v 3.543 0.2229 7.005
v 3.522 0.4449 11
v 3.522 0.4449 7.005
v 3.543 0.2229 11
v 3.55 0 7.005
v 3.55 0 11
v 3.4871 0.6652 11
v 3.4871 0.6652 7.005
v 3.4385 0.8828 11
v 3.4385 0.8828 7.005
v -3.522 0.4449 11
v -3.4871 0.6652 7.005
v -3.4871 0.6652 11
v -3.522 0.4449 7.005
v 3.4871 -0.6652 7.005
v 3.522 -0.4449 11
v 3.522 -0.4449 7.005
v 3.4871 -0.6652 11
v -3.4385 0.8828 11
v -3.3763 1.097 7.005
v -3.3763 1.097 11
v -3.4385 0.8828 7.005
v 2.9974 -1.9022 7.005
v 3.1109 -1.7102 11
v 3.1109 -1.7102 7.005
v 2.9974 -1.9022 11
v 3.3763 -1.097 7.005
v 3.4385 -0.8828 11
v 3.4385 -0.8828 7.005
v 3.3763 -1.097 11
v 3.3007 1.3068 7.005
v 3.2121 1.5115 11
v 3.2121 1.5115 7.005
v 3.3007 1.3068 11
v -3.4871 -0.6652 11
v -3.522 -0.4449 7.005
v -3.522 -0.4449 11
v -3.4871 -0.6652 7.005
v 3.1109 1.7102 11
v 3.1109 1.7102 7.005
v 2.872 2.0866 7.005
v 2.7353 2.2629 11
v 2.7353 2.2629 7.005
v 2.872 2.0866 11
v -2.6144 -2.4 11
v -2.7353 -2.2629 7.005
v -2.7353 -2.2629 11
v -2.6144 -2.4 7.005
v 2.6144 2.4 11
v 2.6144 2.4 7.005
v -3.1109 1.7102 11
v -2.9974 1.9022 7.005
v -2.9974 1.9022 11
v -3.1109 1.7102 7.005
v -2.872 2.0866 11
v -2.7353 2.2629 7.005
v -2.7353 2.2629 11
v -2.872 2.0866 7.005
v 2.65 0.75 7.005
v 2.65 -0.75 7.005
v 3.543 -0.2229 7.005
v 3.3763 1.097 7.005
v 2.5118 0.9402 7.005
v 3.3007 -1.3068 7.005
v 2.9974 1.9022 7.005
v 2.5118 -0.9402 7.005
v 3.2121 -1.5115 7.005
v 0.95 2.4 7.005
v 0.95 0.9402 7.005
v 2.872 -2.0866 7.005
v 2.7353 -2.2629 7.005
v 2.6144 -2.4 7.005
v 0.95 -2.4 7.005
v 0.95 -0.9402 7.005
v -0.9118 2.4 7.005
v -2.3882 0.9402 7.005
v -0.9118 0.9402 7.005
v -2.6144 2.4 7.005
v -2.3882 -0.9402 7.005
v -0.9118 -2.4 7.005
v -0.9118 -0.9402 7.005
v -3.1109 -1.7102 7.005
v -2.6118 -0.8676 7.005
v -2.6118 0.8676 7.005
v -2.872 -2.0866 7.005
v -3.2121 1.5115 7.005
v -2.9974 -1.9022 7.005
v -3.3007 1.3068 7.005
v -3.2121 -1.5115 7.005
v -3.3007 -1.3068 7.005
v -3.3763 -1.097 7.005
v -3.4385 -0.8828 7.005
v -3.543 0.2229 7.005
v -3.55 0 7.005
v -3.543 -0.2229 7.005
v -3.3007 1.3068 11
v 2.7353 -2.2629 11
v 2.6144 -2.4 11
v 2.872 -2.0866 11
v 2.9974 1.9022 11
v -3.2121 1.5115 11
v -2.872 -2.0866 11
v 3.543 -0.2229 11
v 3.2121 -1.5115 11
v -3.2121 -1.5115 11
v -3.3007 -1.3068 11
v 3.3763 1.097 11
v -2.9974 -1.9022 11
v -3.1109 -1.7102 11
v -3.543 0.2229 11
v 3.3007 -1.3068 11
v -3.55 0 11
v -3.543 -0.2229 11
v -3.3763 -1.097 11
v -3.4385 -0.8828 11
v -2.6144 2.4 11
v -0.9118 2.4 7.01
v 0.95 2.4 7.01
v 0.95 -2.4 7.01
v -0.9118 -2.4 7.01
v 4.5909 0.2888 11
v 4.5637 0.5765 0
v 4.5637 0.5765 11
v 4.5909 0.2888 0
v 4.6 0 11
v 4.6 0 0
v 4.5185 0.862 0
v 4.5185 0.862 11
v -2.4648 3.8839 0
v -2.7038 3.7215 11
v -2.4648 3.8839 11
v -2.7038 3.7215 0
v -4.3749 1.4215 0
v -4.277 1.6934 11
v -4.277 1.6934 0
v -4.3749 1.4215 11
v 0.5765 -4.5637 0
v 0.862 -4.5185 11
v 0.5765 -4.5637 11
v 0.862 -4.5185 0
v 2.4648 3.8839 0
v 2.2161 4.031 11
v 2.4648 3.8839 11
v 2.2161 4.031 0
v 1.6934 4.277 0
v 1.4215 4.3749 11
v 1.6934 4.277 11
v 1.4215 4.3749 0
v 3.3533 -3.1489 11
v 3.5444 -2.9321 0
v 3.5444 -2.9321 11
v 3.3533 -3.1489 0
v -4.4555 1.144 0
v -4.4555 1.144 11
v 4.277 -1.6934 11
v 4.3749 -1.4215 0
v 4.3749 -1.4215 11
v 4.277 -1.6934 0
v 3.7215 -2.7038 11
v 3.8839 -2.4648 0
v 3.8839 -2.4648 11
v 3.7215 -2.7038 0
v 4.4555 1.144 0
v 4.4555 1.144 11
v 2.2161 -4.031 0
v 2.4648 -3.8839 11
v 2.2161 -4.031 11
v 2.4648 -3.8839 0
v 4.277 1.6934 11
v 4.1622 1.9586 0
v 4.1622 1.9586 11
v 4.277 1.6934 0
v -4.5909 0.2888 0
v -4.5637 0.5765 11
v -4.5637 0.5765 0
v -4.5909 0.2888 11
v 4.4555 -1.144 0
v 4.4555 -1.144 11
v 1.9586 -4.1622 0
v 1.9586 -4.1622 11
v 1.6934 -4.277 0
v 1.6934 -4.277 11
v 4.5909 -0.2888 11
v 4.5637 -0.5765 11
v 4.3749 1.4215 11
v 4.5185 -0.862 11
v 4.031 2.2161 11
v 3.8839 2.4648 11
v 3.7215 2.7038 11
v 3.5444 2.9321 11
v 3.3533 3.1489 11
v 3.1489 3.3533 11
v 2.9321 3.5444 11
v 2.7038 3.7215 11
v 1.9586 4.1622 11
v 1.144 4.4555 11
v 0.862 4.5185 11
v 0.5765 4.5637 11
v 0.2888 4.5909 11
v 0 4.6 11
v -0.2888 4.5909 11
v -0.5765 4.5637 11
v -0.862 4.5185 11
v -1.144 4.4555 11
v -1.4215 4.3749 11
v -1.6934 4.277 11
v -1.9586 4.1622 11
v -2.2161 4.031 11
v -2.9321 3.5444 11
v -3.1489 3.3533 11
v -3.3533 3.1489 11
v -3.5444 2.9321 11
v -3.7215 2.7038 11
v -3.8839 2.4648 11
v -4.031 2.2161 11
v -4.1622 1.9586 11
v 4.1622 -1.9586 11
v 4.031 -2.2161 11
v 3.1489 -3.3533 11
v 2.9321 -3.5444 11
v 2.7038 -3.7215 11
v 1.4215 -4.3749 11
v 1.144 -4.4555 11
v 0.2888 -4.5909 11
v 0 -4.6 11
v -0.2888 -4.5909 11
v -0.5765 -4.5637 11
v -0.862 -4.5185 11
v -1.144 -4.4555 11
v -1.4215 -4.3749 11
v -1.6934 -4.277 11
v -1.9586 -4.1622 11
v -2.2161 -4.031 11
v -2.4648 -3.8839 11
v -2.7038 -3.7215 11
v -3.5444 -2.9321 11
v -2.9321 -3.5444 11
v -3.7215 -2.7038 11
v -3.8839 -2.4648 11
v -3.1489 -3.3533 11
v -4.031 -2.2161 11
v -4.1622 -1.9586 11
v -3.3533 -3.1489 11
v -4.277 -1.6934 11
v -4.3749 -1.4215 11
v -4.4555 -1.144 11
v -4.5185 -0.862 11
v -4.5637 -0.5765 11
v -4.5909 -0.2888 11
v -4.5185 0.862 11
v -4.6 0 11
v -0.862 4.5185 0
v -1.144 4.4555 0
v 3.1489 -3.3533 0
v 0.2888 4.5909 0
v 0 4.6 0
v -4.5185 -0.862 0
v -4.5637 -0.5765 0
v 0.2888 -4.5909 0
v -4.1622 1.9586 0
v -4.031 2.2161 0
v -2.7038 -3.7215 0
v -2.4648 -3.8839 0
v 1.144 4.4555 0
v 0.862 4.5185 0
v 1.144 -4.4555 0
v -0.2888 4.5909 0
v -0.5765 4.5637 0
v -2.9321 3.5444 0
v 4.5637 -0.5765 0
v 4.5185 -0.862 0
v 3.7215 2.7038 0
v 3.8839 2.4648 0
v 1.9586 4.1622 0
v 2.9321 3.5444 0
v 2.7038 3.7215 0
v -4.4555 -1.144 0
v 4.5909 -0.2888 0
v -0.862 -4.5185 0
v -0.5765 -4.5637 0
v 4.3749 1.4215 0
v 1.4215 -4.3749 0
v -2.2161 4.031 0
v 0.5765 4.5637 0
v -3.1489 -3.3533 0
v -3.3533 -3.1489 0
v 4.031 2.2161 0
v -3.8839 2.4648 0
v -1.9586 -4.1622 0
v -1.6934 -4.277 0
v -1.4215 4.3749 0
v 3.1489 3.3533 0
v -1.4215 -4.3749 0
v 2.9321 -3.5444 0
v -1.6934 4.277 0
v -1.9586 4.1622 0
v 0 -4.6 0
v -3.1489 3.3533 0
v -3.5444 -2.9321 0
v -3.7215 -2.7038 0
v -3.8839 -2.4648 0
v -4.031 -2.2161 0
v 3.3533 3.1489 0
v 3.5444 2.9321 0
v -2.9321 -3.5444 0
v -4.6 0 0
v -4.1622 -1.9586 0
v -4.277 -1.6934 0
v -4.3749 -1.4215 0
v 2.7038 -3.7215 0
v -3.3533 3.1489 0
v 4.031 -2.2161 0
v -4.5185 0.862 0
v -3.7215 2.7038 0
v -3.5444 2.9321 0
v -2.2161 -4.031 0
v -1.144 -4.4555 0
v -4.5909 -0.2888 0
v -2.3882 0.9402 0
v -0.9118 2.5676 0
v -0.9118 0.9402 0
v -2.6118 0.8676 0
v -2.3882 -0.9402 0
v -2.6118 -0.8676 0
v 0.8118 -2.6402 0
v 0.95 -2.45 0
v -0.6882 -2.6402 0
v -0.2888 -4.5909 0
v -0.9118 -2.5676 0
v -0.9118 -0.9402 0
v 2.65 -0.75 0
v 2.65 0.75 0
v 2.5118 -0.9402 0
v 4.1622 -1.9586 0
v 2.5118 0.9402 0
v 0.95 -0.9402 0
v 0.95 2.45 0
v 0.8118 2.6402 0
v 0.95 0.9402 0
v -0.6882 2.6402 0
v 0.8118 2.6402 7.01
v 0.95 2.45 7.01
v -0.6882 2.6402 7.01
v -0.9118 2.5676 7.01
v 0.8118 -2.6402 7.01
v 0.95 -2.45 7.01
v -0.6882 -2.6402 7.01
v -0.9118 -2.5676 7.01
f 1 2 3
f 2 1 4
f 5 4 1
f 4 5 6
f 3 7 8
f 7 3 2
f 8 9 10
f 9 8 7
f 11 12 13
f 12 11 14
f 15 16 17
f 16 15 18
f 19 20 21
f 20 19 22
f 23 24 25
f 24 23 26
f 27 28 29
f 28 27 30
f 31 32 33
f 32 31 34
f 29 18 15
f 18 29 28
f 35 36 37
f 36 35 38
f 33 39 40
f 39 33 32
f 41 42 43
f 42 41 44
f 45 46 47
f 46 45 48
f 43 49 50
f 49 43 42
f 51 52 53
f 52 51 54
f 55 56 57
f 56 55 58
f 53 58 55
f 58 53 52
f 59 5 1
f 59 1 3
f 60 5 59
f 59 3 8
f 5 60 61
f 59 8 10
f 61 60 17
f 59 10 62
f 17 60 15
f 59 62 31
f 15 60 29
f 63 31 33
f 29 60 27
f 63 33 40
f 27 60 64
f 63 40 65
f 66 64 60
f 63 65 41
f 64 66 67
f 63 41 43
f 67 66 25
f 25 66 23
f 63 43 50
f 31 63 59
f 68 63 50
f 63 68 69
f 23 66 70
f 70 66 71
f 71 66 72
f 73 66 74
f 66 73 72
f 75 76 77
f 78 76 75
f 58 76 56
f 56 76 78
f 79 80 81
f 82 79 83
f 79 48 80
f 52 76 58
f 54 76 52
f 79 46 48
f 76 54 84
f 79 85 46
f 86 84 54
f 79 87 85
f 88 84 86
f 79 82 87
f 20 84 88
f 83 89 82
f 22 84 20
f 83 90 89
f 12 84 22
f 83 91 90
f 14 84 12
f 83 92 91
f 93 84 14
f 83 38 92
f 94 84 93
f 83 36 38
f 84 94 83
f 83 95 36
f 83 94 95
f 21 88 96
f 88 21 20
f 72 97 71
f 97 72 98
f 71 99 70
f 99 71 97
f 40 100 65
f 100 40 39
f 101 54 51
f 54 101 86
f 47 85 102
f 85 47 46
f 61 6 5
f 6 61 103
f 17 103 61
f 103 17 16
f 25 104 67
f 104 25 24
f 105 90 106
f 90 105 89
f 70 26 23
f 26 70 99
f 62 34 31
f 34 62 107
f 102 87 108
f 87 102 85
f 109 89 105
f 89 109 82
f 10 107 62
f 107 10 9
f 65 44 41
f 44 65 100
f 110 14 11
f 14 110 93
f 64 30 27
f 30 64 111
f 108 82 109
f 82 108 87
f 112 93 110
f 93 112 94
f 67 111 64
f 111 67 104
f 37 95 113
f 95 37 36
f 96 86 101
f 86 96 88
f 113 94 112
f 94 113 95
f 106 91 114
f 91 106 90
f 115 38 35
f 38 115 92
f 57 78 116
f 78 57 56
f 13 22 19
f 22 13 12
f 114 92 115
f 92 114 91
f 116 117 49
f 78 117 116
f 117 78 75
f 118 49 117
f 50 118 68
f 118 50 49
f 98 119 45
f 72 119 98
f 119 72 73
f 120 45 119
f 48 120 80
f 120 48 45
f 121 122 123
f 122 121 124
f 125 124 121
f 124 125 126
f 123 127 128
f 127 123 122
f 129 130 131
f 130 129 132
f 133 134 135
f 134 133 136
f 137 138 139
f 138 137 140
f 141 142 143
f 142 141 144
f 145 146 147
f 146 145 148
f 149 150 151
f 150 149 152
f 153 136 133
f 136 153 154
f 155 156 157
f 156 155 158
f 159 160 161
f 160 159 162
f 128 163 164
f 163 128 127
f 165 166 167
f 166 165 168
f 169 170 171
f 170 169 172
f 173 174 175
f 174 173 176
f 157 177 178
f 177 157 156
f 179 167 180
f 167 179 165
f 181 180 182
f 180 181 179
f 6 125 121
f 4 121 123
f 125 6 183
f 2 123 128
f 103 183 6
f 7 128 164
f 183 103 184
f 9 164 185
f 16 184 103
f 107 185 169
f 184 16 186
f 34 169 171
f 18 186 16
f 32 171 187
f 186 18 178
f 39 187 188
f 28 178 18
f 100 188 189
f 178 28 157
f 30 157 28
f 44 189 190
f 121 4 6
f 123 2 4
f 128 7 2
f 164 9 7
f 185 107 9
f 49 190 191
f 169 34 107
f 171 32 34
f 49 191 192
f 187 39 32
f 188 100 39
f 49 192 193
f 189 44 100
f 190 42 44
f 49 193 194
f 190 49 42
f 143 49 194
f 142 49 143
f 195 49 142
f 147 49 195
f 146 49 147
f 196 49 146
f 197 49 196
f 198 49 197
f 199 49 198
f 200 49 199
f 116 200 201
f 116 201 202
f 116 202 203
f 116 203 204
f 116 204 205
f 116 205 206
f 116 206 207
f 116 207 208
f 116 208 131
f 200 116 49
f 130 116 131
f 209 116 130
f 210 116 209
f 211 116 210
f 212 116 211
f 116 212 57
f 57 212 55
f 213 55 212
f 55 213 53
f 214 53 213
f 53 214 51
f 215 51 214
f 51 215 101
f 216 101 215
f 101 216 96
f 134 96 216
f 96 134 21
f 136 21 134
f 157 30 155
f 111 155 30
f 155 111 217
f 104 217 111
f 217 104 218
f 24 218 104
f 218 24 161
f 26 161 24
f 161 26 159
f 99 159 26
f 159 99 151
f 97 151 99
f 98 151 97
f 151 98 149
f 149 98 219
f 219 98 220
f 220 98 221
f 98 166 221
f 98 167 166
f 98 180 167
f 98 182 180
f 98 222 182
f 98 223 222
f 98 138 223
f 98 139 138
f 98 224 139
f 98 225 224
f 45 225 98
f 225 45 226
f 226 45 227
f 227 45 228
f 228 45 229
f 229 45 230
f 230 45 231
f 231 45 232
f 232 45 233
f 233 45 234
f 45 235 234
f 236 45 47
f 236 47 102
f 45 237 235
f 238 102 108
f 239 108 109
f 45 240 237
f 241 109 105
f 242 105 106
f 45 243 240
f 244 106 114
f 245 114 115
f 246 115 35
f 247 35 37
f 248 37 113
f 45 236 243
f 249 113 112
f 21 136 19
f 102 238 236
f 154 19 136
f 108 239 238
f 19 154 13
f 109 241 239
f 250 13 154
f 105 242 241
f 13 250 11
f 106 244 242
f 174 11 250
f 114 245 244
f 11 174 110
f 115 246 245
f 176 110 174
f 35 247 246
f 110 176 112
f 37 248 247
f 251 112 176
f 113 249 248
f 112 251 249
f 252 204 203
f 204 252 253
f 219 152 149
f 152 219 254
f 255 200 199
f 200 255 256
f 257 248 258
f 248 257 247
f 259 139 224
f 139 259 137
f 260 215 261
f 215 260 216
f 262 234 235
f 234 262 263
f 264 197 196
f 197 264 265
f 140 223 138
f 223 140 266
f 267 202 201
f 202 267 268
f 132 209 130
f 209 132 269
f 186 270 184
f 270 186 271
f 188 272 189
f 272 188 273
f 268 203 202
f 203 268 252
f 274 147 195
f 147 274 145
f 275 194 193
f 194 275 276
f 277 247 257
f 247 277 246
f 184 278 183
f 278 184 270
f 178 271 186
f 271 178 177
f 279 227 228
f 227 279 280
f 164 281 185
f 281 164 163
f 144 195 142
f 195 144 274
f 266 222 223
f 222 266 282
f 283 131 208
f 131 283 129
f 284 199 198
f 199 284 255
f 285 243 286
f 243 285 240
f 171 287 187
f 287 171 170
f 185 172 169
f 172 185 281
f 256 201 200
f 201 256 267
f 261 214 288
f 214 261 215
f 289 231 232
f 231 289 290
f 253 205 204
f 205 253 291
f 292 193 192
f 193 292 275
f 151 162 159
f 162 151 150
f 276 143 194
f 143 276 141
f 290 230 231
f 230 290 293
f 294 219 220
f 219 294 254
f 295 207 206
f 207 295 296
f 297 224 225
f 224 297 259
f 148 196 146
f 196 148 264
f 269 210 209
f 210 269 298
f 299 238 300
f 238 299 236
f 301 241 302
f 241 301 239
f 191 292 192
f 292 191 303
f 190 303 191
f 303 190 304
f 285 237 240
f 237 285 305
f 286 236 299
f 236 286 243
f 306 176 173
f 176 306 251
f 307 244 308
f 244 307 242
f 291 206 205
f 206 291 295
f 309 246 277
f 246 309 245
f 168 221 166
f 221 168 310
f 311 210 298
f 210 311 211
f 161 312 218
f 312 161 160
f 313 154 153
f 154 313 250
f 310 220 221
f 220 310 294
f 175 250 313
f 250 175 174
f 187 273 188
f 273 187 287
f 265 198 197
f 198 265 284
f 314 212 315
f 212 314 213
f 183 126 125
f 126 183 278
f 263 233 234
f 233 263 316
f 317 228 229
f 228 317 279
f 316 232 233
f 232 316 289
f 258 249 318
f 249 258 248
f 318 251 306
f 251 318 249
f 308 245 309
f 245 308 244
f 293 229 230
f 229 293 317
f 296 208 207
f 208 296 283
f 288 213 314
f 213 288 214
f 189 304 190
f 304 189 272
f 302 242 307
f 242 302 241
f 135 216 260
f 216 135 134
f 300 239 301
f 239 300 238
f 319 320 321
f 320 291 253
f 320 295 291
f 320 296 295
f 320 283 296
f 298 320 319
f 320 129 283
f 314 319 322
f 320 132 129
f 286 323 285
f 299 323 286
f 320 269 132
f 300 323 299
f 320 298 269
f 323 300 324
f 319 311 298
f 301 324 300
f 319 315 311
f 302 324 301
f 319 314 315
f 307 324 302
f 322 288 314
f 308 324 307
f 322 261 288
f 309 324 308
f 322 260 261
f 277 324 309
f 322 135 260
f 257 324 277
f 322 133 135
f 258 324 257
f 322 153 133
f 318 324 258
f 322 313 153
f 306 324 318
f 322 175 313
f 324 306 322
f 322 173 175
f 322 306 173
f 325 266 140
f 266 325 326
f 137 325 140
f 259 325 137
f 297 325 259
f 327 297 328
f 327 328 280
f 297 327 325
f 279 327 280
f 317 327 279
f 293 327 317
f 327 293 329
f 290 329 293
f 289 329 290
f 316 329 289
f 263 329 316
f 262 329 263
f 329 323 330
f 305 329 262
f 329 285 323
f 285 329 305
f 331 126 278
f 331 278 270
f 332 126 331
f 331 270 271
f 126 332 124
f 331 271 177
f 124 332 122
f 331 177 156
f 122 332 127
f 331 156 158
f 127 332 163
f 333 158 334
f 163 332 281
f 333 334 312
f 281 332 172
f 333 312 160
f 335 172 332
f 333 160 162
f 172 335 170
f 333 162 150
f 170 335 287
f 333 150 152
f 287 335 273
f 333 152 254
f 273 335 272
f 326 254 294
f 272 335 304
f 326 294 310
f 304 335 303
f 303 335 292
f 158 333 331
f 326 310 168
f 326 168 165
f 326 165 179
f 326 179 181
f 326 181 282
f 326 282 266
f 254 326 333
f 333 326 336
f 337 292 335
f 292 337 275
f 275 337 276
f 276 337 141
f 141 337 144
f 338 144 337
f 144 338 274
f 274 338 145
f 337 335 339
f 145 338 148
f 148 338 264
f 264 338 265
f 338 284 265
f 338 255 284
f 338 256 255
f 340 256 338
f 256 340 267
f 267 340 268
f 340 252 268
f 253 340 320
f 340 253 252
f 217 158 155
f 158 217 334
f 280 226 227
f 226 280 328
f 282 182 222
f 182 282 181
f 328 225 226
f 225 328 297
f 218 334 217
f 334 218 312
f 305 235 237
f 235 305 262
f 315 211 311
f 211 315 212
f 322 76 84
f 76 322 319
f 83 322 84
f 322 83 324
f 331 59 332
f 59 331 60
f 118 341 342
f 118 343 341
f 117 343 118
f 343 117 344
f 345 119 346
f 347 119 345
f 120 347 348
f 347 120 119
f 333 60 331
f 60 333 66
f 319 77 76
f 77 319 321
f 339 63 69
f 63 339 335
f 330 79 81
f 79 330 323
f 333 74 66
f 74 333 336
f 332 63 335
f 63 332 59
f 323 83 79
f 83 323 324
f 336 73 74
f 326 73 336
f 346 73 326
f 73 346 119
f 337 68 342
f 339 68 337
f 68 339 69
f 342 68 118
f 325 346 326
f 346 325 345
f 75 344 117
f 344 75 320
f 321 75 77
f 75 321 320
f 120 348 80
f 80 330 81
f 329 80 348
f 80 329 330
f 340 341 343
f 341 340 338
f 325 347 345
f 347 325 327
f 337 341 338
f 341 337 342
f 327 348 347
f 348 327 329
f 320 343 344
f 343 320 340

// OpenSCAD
// DC motor shaft to lego coupler
//
// Created by Moby Disk, 2015/02/08
// Thanks to mrob27 for thing 40410
// Changed by Drato to fit a Solarbotics GM8 Motor http://www.thingiverse.com/thing:1013155

// Diameters of various motor shafts:
// - Radio Shack 2730223: 2.0mm
// - Radio Shack 2730256: 2.3mm

// When 3D printing couplers, always try 0.1 - 0.3mm too big and test to see what actually fits

// Diameter of motor axle cutout, in mm, if motor axle is round without cutouts diameter is the same as motor_axle_diameter
motor_axle_cutout_diameter = 4.8;

// Diameter of motor axle, in mm
motor_axle_diameter = 7.1;

// Do you want to try some different axle sizes to see what fits best?
try_bigger_sizes = "no"; // [yes,no]

// Length of the axle part, in mm
axle_length = 7;
// Length of the motor axle part, in mm
motor_axle_length = 4;

// Outside radius of the coupler, in mm
coupler_outside_diameter = 9.2;

coupler_round_to_lego_axle(motor_axle_diameter,0, axle_length, motor_axle_length, coupler_outside_diameter);

spacing=coupler_outside_diameter*1.5;

if (try_bigger_sizes=="yes")
{
	for (bigger=[1:3])
	{
		translate([bigger*spacing,0,0])
		coupler_round_to_lego_axle(motor_axle_diameter,0.1*bigger, axle_length, motor_axle_length, coupler_outside_diameter);
	}
}

// Coupler for round DC motor shafts
// 
// diameter: diameter of the motor's axle
// fudge: Additional radius for the axle hole
//        - For 3D printing, the hole for the motor shaft must be larger than the actual axle itself
//        - 0.2mm and 0.3mm seem to work, but this may vary based on the printer and material
// length: A lego coupler is typically 15.9mm
// outside: outside diameter, increase for more strength
//
module coupler_round_to_lego_axle(diameter, fudge=0.2, axle_length=7, motor_axle_length=4, outside=7.2)
{
   // axle thickness is actually about 1.8 mm.  But for 3D printing, holes need to be bigger.
   axle_gap = 1.9;
   hole_radius = 2.65;

length = axle_length + motor_axle_length;
    
   motor_axle_diameter=diameter + fudge;
   difference()
   {
      // The coupler body
      translate([0,0,length/2])
      cylinder(r=outside/2,h=length,center=true,$fn=100);

      // The lego cross-axle hole
      translate([0 - hole_radius, 0 - axle_gap/2, -0.01])
      roundedRect([hole_radius * 2, axle_gap, axle_length+0.02], .2);
      translate([0 - axle_gap/2, 0 - hole_radius, -0.01])
      roundedRect([axle_gap, hole_radius * 2, axle_length+0.02], .2);

      difference()
      {
        // The hole for the motor shaft
        translate([0, 0, length-motor_axle_length/2+0.01])
        cylinder(r=motor_axle_diameter/2,h=motor_axle_length+0.01,center=true,$fn=100);
          
        translate([0,motor_axle_diameter/2+motor_axle_cutout_diameter/2, length-motor_axle_length/2+0.01])
        cube([motor_axle_diameter, motor_axle_diameter, motor_axle_length+0.01], true);
          
        translate([0,-motor_axle_diameter/2-motor_axle_cutout_diameter/2, length-motor_axle_length/2+0.01])
        cube([motor_axle_diameter, motor_axle_diameter, motor_axle_length+0.01], true);
      }
   }
}

// ---------------------------------------------------------------------------------
//
// module for rounded rectangles by tlrobinson on Thingiverse in a 
// comment posted to http://www.thingiverse.com/thing:9347 on March
// 29, 2012, 3:57:46 AM EDT
//
module roundedRect(size, radius) {  
  x = size[0];  
  y = size[1];  
  z = size[2];  
 
  linear_extrude(height=z)  
  hull() {  
    translate([radius, radius, 0])  
      circle(r=radius);  
 
    translate([x - radius, radius, 0])  
      circle(r=radius);  
 
    translate([x - radius, y - radius, 0])  
      circle(r=radius);  
 
    translate([radius, y - radius, 0])  
      circle(r=radius);  
  }  
}
